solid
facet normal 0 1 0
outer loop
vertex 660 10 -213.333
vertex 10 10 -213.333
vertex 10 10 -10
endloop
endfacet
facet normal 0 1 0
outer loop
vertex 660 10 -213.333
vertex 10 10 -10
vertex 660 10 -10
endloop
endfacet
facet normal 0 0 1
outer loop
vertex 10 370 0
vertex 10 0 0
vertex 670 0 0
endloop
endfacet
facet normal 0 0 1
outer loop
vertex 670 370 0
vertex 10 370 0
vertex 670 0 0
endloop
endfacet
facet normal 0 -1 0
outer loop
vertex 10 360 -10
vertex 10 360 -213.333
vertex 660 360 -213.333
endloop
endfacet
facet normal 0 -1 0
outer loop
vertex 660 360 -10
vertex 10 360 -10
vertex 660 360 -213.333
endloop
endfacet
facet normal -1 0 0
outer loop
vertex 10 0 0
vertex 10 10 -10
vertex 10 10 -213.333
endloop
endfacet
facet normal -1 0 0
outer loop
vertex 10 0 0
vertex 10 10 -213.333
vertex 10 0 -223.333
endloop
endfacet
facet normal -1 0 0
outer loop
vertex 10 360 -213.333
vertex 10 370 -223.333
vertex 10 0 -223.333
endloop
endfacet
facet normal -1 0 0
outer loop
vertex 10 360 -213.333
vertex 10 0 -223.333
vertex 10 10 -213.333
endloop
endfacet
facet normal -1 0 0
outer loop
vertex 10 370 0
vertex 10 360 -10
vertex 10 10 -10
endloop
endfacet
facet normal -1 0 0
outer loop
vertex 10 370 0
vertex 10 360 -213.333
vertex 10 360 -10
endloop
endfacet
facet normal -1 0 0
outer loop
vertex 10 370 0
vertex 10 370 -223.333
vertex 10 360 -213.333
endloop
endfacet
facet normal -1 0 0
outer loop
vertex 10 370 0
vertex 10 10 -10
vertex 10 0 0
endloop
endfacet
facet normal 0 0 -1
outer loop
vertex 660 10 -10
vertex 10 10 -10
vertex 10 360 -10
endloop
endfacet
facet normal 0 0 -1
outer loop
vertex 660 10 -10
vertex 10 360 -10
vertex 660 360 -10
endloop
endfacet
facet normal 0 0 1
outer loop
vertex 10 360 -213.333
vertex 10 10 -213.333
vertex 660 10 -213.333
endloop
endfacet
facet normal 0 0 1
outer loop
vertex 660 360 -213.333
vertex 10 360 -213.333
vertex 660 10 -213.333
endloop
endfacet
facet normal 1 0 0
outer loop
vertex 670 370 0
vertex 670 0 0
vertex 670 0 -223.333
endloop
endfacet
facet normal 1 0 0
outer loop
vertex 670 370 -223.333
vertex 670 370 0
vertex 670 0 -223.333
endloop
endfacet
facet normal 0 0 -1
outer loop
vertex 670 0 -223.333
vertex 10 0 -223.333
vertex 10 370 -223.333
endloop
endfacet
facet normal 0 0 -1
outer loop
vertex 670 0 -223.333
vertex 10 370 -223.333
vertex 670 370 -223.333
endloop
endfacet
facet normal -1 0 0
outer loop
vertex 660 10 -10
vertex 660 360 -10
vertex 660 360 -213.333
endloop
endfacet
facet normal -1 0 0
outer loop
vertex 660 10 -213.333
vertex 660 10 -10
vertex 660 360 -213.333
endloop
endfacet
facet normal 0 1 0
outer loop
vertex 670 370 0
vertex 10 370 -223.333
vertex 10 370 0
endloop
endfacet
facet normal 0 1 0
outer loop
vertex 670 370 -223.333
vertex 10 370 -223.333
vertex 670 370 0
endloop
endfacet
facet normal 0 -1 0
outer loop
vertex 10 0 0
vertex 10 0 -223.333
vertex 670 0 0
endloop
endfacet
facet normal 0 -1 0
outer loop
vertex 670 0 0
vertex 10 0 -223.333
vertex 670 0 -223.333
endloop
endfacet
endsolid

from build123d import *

# Parameters (mm, degrees)
SKETCH1_W           = 670
SKETCH1_H           = 223.333333333
BOSS_EXTRUDE1_DEPTH = 370
SHELL1_T            = -10
SKETCH5_W           = 213.333333333
SKETCH5_H           = 360
CUT_EXTRUDE1_DEPTH  = 10
SKETCH7_W           = 223.333333333
SKETCH7_H           = 370
CUT_EXTRUDE2_DEPTH  = 10


with BuildPart() as part:
    # Sketch1 → Boss-Extrude1 (new body)
    with BuildSketch(Plane(origin=(0, 0, 0), x_dir=(1, 0, 0), z_dir=(0, 1, 0))):
        with Locations((335, 111.666666667)):
            Rectangle(SKETCH1_W, SKETCH1_H)
    extrude(amount=BOSS_EXTRUDE1_DEPTH)

    # Shell1
    shell1_openings = [part.faces().sort_by_distance(p)[0] for p in [
        (0, 185, -111.666666667),
    ]]
    offset(amount=SHELL1_T, openings=shell1_openings, kind=Kind.INTERSECTION)

    # Sketch5 → Cut-Extrude1 (cut)
    with BuildSketch(Plane.ZY):
        with Locations((-111.666666667, 185)):
            Rectangle(SKETCH5_W, SKETCH5_H)
    extrude(amount=-CUT_EXTRUDE1_DEPTH, mode=Mode.SUBTRACT)

    # Sketch7 → Cut-Extrude2 (cut)
    with BuildSketch(Plane.ZY):
        with Locations((-111.666666667, 185)):
            Rectangle(SKETCH7_W, SKETCH7_H)
    extrude(amount=-CUT_EXTRUDE2_DEPTH, mode=Mode.SUBTRACT)


solid = part.part
